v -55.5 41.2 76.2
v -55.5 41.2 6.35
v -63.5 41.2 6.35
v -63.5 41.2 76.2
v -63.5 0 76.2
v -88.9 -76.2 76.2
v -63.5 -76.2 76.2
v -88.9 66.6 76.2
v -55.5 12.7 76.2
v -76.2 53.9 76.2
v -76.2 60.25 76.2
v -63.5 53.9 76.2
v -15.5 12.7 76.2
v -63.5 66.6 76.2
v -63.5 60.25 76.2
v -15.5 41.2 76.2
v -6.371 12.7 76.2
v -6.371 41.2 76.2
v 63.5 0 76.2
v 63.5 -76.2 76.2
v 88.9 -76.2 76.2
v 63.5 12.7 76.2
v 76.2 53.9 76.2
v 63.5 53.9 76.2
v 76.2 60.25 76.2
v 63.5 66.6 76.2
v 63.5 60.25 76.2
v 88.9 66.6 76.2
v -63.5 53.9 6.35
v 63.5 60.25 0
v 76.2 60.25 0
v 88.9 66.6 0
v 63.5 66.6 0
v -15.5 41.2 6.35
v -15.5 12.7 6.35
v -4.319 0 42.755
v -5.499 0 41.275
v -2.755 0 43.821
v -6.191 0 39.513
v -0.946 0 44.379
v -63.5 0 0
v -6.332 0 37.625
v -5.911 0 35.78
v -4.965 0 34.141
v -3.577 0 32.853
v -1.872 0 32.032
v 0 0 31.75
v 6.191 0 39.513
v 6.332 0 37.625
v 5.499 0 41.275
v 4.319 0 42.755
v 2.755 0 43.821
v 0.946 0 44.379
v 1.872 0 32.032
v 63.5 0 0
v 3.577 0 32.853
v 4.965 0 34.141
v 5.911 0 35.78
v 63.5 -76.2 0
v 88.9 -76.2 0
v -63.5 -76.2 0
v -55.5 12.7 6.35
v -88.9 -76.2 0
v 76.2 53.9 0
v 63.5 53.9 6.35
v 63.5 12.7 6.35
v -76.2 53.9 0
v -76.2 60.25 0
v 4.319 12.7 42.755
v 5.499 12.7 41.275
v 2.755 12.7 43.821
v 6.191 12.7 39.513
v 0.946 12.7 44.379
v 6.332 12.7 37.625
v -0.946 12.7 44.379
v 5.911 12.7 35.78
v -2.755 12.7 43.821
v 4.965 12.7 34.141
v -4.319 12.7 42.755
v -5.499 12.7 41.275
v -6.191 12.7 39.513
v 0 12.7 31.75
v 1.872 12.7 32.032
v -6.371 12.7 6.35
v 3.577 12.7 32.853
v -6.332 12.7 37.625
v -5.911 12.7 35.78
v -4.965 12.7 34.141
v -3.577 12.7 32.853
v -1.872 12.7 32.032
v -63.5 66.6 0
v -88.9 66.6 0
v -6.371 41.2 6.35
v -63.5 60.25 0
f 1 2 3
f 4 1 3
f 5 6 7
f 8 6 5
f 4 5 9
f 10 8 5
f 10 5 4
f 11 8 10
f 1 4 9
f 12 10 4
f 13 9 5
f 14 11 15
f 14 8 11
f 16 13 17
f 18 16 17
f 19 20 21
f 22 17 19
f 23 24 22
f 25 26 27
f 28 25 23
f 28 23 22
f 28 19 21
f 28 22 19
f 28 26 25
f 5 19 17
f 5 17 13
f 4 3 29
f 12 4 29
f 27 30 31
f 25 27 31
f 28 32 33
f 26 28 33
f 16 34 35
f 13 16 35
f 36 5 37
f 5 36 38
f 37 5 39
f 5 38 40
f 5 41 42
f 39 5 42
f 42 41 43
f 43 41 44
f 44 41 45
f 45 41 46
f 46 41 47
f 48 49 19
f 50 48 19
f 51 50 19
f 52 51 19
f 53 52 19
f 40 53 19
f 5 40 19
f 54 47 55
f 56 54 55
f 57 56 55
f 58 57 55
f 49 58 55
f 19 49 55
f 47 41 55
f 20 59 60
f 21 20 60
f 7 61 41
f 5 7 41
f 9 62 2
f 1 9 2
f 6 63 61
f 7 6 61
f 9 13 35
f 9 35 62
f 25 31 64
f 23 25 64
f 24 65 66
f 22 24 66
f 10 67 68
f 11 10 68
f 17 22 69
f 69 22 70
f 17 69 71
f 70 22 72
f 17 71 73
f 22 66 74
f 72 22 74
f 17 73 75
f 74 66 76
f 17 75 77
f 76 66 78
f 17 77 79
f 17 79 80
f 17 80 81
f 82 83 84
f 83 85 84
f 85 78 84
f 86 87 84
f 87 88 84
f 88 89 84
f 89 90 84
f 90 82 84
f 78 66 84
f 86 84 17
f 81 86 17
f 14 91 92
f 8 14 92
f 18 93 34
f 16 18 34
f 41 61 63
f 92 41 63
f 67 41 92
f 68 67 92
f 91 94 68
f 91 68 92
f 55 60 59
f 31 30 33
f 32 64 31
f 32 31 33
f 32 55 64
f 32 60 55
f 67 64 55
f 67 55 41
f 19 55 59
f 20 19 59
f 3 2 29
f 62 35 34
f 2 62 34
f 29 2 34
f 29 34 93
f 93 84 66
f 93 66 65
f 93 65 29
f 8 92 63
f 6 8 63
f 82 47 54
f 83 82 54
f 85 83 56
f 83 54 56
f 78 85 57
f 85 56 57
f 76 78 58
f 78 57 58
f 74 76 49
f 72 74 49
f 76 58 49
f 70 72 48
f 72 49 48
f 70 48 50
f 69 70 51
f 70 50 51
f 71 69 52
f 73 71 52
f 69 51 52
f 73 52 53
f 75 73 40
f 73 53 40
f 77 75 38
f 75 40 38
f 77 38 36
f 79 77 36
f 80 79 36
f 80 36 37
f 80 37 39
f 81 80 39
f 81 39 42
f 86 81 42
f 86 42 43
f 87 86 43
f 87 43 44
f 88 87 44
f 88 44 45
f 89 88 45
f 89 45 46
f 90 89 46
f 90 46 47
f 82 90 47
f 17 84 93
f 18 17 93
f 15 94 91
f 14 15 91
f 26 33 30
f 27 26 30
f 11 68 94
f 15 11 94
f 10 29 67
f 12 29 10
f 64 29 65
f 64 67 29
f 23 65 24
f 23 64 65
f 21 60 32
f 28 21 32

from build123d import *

# Parameters (mm, degrees)
BOSS_EXTRUDE1_DEPTH = 76.2
SKETCH2_W           = 6.35
SKETCH2_H           = 41.2
BOSS_EXTRUDE2_DEPTH = 127
SKETCH3_R           = 6.35
CUT_EXTRUDE1_DEPTH  = 105.2


with BuildPart() as part:
    # Sketch1 → Boss-Extrude1 (new body)
    with BuildSketch(Plane.XY):
        Polygon((-63.5, 0), (63.5, 0), (63.5, -76.2), (88.9, -76.2), (88.9, 66.6), (63.5, 66.6), (63.5, 60.25), (76.2, 60.25), (76.2, 53.9), (63.5, 53.9), (63.5, 12.7), (-6.371461067, 12.7), (-6.371461067, 41.2), (-15.5, 41.2), (-15.5, 12.7), (-55.5, 12.7), (-55.5, 41.2), (-63.5, 41.2), (-63.5, 53.9), (-76.2, 53.9), (-76.2, 60.25), (-63.5, 60.25), (-63.5, 66.6), (-88.9, 66.6), (-88.9, -76.2), (-63.5, -76.2), align=None)
    extrude(amount=BOSS_EXTRUDE1_DEPTH)

    # Sketch2 → Boss-Extrude2 (add)
    with BuildSketch(Plane.ZY.offset(-63.5)):
        with Locations((3.175, 33.3)):
            Rectangle(SKETCH2_W, SKETCH2_H)
    extrude(amount=BOSS_EXTRUDE2_DEPTH)

    # Sketch3 → Cut-Extrude1 (cut)
    with BuildSketch(Plane.XZ):
        with Locations(Location((0, 38.1, 0), (0, 0, 270))):
            Circle(SKETCH3_R)
    extrude(amount=-CUT_EXTRUDE1_DEPTH, mode=Mode.SUBTRACT)


solid = part.part
